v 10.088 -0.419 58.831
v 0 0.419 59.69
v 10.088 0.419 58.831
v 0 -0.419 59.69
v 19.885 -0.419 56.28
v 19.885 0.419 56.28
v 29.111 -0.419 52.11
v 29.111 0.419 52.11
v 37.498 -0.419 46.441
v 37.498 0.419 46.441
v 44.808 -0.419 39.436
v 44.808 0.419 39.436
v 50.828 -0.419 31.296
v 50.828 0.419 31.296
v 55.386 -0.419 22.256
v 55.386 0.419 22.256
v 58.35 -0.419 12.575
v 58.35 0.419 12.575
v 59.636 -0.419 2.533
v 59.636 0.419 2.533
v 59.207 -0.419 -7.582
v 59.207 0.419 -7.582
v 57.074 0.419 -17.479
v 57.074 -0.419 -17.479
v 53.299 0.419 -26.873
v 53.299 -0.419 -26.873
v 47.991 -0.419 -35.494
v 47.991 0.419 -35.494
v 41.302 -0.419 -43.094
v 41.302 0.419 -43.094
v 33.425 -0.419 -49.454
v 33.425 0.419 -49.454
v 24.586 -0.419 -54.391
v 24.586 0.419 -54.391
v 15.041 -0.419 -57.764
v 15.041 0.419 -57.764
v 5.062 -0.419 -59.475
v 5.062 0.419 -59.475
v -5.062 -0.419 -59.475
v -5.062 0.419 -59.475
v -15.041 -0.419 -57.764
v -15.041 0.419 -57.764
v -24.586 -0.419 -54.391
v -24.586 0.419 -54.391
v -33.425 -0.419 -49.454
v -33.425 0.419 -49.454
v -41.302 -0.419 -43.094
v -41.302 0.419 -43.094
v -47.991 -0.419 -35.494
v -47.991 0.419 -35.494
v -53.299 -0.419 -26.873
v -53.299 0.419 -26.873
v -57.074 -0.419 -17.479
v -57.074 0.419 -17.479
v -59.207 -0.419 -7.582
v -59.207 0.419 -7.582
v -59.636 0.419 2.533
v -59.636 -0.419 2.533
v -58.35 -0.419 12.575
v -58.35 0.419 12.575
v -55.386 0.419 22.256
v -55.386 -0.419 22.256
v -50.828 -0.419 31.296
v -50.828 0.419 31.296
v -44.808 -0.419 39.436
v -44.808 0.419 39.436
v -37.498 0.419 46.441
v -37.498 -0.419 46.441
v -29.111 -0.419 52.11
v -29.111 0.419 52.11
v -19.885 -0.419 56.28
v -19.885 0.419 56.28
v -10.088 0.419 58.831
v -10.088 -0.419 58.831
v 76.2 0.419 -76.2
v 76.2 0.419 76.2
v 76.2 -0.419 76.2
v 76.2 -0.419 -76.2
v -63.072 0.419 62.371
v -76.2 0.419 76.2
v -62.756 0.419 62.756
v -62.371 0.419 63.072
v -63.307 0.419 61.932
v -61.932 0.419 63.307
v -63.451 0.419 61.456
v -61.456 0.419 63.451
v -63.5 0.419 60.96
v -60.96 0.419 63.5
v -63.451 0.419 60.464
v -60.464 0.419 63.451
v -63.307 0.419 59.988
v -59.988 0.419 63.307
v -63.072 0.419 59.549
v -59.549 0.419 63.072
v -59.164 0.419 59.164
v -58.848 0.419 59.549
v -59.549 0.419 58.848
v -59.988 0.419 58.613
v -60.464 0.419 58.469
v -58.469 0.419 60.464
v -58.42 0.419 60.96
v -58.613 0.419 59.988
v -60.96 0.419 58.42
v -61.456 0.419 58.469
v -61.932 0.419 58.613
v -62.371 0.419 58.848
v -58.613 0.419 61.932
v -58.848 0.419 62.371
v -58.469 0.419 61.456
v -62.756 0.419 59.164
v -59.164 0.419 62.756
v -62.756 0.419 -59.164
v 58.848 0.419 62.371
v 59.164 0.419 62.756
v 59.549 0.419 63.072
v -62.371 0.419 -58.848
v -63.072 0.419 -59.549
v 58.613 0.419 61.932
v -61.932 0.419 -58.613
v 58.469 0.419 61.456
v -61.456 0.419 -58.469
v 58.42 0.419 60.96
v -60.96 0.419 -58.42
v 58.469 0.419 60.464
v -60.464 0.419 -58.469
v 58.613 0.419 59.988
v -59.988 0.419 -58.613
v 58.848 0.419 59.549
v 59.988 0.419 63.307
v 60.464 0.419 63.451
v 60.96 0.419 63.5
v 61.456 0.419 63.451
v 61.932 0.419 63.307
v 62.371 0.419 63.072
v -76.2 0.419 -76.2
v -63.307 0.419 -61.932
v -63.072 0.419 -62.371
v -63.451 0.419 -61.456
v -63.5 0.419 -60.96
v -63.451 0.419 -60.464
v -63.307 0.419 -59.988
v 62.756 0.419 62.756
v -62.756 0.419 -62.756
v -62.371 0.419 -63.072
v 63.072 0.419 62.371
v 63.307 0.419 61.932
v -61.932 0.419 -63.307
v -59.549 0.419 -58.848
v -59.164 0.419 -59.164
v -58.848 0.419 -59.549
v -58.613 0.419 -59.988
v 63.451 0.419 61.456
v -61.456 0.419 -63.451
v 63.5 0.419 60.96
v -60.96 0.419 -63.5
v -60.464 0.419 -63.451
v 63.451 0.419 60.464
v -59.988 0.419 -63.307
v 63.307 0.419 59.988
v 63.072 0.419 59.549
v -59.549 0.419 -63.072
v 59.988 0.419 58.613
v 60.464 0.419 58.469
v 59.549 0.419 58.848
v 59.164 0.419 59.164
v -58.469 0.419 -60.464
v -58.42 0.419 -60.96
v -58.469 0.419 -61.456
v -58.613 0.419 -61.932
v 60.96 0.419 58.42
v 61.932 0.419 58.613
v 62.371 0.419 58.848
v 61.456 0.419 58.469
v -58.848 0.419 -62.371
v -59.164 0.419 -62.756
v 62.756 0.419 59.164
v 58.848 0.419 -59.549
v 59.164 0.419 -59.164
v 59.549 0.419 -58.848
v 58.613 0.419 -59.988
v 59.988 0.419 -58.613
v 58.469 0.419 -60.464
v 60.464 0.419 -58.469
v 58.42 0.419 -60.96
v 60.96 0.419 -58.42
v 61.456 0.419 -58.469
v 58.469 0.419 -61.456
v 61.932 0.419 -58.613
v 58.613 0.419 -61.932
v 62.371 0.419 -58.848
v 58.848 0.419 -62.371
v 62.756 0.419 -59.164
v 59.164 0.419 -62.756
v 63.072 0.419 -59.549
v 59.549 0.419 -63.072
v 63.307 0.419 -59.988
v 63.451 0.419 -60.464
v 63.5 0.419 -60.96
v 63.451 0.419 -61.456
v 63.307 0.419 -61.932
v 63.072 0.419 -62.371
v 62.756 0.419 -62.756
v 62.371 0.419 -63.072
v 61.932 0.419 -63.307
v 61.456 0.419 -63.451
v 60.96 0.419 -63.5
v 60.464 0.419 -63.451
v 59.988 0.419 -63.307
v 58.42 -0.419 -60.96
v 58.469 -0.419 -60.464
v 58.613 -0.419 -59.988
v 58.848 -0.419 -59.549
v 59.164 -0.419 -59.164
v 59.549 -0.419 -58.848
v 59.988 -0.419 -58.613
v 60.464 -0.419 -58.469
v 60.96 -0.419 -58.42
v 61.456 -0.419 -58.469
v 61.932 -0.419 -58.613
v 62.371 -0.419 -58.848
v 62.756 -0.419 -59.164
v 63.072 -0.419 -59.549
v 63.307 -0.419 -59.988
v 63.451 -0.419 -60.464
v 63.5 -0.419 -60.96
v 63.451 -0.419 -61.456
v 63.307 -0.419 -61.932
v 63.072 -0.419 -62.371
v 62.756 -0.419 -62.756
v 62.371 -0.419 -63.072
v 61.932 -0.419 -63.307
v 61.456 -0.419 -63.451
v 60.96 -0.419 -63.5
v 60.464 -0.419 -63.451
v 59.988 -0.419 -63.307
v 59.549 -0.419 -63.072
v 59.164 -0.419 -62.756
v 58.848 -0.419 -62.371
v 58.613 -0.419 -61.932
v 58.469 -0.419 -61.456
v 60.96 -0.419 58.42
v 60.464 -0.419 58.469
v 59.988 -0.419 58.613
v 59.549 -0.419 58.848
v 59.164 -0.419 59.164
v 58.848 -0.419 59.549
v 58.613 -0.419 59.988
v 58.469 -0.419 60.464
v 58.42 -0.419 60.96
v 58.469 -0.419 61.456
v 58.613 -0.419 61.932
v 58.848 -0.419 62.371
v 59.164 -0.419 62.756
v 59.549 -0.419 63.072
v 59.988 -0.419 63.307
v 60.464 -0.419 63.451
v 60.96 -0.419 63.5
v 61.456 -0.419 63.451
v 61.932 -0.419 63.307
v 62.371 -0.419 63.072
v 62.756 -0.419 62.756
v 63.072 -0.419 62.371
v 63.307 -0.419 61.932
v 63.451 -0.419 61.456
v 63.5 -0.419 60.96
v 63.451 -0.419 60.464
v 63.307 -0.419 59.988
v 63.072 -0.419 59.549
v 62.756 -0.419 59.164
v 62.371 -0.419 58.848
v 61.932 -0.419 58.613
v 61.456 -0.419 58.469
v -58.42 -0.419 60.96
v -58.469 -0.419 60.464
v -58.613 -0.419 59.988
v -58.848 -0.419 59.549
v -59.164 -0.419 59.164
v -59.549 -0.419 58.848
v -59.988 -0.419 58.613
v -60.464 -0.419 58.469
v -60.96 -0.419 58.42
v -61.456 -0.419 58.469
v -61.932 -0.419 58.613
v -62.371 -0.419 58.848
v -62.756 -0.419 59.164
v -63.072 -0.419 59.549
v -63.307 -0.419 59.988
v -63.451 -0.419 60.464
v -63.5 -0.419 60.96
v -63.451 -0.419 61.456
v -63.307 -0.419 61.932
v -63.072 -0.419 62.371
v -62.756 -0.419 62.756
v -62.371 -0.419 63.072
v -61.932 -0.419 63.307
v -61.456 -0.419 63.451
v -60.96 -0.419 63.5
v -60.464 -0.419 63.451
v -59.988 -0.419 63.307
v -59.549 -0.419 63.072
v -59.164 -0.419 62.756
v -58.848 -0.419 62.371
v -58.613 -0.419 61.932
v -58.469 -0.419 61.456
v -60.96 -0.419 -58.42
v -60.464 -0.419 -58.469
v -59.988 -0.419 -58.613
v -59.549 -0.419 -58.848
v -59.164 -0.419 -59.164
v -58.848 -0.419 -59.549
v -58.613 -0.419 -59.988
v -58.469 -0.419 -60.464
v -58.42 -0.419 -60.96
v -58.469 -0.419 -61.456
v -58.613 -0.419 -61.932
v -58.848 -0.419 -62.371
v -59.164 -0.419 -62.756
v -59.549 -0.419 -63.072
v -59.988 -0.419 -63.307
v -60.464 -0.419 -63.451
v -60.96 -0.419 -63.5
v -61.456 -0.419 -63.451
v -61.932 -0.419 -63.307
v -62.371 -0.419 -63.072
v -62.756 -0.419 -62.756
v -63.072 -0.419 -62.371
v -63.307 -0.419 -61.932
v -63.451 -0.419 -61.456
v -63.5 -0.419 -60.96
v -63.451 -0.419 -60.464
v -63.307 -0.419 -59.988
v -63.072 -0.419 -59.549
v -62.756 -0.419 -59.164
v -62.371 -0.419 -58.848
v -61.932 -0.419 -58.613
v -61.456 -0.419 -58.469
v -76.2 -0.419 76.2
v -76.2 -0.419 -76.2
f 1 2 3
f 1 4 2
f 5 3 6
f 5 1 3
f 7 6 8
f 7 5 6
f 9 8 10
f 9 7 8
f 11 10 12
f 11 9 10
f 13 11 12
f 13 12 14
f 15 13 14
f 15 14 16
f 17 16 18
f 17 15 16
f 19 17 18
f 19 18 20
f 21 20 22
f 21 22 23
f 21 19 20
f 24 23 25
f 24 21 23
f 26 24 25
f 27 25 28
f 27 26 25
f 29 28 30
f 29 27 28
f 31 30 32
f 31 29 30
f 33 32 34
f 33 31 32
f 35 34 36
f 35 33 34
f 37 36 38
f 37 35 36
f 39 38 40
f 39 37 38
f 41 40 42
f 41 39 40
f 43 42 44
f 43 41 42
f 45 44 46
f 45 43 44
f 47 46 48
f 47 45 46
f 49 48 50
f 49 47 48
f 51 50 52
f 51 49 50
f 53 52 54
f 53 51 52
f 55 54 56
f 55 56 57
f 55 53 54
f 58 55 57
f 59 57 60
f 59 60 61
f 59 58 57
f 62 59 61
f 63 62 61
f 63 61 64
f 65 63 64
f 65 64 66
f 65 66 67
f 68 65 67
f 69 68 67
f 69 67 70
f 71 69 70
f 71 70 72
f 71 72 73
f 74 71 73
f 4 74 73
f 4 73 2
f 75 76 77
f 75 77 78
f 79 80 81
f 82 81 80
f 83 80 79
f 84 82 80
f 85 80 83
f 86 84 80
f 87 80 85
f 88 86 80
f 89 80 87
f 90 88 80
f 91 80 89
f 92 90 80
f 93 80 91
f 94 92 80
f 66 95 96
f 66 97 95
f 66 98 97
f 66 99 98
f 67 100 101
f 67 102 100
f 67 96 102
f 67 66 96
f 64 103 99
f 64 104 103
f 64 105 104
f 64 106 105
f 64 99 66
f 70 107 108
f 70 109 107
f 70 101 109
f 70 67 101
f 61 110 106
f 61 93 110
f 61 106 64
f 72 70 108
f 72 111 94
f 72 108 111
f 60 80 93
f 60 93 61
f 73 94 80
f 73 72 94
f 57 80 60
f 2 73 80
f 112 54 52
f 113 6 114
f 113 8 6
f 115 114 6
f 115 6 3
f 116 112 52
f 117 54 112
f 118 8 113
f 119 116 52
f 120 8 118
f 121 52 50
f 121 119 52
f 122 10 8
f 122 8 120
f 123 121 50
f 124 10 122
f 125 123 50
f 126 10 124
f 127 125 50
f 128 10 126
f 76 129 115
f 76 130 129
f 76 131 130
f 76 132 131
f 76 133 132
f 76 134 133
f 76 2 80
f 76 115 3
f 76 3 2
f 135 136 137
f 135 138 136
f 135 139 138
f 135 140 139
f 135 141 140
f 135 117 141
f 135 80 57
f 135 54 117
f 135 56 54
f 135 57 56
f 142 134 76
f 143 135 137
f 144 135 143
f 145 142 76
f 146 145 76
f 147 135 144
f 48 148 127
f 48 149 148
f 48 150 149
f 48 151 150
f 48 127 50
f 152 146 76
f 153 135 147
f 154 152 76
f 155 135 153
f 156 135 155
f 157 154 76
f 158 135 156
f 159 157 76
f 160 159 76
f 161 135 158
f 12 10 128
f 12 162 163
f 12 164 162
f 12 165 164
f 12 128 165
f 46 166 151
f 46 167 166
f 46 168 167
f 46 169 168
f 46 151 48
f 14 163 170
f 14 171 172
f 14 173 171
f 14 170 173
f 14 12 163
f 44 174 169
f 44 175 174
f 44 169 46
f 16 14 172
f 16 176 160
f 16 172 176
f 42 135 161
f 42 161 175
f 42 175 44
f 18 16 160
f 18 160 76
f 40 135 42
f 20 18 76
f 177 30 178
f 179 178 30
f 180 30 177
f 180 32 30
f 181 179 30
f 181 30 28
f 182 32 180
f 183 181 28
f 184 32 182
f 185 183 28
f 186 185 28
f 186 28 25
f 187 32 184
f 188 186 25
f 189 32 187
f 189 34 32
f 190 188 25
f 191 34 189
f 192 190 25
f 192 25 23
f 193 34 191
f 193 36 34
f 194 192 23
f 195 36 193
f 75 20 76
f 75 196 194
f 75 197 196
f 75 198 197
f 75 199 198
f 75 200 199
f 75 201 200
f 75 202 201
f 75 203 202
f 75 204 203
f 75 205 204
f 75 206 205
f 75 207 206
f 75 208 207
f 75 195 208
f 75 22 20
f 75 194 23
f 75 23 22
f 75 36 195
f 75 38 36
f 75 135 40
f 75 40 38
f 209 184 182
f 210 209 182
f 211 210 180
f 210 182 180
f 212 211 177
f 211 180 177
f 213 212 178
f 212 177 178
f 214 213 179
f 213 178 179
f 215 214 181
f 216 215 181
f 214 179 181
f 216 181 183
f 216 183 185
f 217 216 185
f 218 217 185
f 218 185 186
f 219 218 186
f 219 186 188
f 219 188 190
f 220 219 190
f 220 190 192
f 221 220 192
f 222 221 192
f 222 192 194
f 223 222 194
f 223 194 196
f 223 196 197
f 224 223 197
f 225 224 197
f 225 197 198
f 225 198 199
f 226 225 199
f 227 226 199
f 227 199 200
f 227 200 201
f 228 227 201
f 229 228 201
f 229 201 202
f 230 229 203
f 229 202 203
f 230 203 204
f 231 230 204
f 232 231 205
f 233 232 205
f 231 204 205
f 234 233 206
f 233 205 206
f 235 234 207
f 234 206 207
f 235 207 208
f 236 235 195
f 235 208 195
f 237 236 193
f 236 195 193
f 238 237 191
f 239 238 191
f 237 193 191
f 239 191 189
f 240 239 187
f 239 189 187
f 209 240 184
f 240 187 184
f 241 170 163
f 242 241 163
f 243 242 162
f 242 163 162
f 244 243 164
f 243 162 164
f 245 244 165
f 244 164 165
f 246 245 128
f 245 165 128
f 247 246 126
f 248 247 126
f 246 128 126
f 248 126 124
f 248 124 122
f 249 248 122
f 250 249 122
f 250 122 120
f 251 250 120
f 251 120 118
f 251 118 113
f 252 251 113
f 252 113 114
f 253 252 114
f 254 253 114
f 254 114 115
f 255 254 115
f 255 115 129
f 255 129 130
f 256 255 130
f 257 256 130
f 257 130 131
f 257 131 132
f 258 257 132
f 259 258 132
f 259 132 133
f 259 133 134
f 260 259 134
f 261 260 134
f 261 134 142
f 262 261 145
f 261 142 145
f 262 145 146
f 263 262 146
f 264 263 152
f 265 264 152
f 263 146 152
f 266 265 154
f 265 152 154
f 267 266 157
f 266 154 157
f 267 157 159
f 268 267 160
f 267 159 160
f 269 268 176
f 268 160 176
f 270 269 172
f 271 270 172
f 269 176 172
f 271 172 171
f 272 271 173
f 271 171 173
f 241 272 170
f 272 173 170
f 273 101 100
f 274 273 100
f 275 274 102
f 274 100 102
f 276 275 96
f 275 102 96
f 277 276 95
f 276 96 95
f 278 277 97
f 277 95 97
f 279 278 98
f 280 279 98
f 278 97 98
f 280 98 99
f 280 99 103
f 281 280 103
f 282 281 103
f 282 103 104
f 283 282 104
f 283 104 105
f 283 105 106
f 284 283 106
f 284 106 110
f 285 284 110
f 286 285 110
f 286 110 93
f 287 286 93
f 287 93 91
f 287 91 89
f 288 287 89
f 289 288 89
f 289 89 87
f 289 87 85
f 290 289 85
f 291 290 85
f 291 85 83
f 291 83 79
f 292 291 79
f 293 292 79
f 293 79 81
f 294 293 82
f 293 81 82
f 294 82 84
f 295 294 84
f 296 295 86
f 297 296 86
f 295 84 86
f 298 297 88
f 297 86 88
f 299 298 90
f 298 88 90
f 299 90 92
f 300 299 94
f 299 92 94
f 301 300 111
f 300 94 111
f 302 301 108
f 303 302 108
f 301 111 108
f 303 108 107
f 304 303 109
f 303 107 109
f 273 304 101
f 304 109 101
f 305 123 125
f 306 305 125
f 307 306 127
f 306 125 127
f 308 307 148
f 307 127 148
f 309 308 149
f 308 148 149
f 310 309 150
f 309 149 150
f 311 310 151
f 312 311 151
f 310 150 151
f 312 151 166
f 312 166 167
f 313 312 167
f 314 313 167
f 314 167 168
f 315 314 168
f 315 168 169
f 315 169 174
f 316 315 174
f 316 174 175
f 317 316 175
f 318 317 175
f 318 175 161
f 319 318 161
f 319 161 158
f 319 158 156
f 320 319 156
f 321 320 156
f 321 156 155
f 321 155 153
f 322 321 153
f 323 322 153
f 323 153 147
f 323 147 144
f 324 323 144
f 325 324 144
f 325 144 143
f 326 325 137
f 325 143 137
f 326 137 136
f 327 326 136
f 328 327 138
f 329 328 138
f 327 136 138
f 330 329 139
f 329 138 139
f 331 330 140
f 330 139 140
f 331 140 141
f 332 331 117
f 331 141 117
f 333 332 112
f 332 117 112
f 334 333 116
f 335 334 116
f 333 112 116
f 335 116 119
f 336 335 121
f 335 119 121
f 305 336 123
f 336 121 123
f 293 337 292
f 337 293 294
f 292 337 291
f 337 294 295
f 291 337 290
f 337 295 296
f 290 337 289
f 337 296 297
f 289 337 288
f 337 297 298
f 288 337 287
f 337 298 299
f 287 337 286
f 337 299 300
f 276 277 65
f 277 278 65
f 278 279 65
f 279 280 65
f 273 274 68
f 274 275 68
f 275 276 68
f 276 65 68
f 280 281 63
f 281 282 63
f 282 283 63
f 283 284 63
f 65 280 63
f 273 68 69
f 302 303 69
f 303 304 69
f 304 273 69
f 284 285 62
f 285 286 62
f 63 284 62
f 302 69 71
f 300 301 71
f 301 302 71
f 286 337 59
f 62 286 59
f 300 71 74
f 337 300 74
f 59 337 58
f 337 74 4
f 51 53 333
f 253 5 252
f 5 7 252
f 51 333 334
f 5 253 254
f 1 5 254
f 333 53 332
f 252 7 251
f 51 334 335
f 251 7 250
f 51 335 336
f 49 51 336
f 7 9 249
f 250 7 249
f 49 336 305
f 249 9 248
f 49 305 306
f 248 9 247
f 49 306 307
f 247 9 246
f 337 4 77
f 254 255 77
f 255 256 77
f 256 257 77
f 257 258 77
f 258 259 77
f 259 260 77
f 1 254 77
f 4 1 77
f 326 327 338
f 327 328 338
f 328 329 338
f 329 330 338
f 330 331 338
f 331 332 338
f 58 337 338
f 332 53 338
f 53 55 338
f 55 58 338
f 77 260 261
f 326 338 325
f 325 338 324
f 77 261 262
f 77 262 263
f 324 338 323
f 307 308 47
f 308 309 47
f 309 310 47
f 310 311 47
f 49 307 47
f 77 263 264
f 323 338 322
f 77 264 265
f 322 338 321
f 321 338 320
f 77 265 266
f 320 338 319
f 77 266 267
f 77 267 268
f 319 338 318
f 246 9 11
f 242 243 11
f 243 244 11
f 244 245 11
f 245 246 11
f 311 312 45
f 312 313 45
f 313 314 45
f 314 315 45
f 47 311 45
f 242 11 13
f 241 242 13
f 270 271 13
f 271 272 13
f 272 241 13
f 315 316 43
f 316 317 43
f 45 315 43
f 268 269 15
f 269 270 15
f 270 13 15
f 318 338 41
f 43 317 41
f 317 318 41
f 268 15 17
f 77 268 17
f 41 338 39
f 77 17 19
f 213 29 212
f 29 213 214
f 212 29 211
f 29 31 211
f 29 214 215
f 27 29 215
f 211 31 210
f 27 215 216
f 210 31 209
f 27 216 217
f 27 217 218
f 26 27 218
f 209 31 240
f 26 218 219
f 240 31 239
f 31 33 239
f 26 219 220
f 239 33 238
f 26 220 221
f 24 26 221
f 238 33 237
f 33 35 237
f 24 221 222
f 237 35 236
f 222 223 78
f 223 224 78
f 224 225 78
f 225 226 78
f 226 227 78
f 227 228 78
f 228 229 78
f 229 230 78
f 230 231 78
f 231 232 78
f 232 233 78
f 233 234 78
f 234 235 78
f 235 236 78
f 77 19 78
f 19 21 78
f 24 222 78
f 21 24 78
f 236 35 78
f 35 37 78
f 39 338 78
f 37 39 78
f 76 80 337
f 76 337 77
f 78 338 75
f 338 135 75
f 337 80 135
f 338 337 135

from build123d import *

# Parameters (mm, degrees)
SKETCH1_W           = 152.4
SKETCH1_H           = 152.4
SKETCH1_R           = 59.69
BOSS_EXTRUDE1_DEPTH = 0.4191
SKETCH2_R           = 2.54
CUT_EXTRUDE1_DEPTH  = 108.766333236
CIRPATTERN1_COUNT   = 4


with BuildPart() as part:
    # Sketch1 → Boss-Extrude1 (new, symmetric)
    with BuildSketch(Plane(origin=(0, 0, 0), x_dir=(1, 0, 0), z_dir=(0, 1, 0))):
        Rectangle(SKETCH1_W, SKETCH1_H)
        with Locations(Location((0, 0, 0), (0, 0, 270))):
            Circle(SKETCH1_R, mode=Mode.SUBTRACT)
    extrude(amount=BOSS_EXTRUDE1_DEPTH, both=True)

    # Sketch2 → Cut-Extrude1 (cut, through all)
    with BuildSketch(Plane(origin=(0, 0.4191, 0), x_dir=(1, 0, 0), z_dir=(0, 1, 0))):
        with Locations(Location((-60.96, 60.96, 0), (0, 0, 270))):
            Circle(SKETCH2_R)
    cut_extrude1 = extrude(amount=-CUT_EXTRUDE1_DEPTH, mode=Mode.SUBTRACT)

    # CirPattern1: Cut-Extrude1 ×4 about axis
    cirpattern1_axis = Axis((0, 0, 0), (0, 1, 0))
    for i in range(1, CIRPATTERN1_COUNT):
        add(cut_extrude1.rotate(cirpattern1_axis, i * 360 / CIRPATTERN1_COUNT), mode=Mode.SUBTRACT)


solid = part.part
